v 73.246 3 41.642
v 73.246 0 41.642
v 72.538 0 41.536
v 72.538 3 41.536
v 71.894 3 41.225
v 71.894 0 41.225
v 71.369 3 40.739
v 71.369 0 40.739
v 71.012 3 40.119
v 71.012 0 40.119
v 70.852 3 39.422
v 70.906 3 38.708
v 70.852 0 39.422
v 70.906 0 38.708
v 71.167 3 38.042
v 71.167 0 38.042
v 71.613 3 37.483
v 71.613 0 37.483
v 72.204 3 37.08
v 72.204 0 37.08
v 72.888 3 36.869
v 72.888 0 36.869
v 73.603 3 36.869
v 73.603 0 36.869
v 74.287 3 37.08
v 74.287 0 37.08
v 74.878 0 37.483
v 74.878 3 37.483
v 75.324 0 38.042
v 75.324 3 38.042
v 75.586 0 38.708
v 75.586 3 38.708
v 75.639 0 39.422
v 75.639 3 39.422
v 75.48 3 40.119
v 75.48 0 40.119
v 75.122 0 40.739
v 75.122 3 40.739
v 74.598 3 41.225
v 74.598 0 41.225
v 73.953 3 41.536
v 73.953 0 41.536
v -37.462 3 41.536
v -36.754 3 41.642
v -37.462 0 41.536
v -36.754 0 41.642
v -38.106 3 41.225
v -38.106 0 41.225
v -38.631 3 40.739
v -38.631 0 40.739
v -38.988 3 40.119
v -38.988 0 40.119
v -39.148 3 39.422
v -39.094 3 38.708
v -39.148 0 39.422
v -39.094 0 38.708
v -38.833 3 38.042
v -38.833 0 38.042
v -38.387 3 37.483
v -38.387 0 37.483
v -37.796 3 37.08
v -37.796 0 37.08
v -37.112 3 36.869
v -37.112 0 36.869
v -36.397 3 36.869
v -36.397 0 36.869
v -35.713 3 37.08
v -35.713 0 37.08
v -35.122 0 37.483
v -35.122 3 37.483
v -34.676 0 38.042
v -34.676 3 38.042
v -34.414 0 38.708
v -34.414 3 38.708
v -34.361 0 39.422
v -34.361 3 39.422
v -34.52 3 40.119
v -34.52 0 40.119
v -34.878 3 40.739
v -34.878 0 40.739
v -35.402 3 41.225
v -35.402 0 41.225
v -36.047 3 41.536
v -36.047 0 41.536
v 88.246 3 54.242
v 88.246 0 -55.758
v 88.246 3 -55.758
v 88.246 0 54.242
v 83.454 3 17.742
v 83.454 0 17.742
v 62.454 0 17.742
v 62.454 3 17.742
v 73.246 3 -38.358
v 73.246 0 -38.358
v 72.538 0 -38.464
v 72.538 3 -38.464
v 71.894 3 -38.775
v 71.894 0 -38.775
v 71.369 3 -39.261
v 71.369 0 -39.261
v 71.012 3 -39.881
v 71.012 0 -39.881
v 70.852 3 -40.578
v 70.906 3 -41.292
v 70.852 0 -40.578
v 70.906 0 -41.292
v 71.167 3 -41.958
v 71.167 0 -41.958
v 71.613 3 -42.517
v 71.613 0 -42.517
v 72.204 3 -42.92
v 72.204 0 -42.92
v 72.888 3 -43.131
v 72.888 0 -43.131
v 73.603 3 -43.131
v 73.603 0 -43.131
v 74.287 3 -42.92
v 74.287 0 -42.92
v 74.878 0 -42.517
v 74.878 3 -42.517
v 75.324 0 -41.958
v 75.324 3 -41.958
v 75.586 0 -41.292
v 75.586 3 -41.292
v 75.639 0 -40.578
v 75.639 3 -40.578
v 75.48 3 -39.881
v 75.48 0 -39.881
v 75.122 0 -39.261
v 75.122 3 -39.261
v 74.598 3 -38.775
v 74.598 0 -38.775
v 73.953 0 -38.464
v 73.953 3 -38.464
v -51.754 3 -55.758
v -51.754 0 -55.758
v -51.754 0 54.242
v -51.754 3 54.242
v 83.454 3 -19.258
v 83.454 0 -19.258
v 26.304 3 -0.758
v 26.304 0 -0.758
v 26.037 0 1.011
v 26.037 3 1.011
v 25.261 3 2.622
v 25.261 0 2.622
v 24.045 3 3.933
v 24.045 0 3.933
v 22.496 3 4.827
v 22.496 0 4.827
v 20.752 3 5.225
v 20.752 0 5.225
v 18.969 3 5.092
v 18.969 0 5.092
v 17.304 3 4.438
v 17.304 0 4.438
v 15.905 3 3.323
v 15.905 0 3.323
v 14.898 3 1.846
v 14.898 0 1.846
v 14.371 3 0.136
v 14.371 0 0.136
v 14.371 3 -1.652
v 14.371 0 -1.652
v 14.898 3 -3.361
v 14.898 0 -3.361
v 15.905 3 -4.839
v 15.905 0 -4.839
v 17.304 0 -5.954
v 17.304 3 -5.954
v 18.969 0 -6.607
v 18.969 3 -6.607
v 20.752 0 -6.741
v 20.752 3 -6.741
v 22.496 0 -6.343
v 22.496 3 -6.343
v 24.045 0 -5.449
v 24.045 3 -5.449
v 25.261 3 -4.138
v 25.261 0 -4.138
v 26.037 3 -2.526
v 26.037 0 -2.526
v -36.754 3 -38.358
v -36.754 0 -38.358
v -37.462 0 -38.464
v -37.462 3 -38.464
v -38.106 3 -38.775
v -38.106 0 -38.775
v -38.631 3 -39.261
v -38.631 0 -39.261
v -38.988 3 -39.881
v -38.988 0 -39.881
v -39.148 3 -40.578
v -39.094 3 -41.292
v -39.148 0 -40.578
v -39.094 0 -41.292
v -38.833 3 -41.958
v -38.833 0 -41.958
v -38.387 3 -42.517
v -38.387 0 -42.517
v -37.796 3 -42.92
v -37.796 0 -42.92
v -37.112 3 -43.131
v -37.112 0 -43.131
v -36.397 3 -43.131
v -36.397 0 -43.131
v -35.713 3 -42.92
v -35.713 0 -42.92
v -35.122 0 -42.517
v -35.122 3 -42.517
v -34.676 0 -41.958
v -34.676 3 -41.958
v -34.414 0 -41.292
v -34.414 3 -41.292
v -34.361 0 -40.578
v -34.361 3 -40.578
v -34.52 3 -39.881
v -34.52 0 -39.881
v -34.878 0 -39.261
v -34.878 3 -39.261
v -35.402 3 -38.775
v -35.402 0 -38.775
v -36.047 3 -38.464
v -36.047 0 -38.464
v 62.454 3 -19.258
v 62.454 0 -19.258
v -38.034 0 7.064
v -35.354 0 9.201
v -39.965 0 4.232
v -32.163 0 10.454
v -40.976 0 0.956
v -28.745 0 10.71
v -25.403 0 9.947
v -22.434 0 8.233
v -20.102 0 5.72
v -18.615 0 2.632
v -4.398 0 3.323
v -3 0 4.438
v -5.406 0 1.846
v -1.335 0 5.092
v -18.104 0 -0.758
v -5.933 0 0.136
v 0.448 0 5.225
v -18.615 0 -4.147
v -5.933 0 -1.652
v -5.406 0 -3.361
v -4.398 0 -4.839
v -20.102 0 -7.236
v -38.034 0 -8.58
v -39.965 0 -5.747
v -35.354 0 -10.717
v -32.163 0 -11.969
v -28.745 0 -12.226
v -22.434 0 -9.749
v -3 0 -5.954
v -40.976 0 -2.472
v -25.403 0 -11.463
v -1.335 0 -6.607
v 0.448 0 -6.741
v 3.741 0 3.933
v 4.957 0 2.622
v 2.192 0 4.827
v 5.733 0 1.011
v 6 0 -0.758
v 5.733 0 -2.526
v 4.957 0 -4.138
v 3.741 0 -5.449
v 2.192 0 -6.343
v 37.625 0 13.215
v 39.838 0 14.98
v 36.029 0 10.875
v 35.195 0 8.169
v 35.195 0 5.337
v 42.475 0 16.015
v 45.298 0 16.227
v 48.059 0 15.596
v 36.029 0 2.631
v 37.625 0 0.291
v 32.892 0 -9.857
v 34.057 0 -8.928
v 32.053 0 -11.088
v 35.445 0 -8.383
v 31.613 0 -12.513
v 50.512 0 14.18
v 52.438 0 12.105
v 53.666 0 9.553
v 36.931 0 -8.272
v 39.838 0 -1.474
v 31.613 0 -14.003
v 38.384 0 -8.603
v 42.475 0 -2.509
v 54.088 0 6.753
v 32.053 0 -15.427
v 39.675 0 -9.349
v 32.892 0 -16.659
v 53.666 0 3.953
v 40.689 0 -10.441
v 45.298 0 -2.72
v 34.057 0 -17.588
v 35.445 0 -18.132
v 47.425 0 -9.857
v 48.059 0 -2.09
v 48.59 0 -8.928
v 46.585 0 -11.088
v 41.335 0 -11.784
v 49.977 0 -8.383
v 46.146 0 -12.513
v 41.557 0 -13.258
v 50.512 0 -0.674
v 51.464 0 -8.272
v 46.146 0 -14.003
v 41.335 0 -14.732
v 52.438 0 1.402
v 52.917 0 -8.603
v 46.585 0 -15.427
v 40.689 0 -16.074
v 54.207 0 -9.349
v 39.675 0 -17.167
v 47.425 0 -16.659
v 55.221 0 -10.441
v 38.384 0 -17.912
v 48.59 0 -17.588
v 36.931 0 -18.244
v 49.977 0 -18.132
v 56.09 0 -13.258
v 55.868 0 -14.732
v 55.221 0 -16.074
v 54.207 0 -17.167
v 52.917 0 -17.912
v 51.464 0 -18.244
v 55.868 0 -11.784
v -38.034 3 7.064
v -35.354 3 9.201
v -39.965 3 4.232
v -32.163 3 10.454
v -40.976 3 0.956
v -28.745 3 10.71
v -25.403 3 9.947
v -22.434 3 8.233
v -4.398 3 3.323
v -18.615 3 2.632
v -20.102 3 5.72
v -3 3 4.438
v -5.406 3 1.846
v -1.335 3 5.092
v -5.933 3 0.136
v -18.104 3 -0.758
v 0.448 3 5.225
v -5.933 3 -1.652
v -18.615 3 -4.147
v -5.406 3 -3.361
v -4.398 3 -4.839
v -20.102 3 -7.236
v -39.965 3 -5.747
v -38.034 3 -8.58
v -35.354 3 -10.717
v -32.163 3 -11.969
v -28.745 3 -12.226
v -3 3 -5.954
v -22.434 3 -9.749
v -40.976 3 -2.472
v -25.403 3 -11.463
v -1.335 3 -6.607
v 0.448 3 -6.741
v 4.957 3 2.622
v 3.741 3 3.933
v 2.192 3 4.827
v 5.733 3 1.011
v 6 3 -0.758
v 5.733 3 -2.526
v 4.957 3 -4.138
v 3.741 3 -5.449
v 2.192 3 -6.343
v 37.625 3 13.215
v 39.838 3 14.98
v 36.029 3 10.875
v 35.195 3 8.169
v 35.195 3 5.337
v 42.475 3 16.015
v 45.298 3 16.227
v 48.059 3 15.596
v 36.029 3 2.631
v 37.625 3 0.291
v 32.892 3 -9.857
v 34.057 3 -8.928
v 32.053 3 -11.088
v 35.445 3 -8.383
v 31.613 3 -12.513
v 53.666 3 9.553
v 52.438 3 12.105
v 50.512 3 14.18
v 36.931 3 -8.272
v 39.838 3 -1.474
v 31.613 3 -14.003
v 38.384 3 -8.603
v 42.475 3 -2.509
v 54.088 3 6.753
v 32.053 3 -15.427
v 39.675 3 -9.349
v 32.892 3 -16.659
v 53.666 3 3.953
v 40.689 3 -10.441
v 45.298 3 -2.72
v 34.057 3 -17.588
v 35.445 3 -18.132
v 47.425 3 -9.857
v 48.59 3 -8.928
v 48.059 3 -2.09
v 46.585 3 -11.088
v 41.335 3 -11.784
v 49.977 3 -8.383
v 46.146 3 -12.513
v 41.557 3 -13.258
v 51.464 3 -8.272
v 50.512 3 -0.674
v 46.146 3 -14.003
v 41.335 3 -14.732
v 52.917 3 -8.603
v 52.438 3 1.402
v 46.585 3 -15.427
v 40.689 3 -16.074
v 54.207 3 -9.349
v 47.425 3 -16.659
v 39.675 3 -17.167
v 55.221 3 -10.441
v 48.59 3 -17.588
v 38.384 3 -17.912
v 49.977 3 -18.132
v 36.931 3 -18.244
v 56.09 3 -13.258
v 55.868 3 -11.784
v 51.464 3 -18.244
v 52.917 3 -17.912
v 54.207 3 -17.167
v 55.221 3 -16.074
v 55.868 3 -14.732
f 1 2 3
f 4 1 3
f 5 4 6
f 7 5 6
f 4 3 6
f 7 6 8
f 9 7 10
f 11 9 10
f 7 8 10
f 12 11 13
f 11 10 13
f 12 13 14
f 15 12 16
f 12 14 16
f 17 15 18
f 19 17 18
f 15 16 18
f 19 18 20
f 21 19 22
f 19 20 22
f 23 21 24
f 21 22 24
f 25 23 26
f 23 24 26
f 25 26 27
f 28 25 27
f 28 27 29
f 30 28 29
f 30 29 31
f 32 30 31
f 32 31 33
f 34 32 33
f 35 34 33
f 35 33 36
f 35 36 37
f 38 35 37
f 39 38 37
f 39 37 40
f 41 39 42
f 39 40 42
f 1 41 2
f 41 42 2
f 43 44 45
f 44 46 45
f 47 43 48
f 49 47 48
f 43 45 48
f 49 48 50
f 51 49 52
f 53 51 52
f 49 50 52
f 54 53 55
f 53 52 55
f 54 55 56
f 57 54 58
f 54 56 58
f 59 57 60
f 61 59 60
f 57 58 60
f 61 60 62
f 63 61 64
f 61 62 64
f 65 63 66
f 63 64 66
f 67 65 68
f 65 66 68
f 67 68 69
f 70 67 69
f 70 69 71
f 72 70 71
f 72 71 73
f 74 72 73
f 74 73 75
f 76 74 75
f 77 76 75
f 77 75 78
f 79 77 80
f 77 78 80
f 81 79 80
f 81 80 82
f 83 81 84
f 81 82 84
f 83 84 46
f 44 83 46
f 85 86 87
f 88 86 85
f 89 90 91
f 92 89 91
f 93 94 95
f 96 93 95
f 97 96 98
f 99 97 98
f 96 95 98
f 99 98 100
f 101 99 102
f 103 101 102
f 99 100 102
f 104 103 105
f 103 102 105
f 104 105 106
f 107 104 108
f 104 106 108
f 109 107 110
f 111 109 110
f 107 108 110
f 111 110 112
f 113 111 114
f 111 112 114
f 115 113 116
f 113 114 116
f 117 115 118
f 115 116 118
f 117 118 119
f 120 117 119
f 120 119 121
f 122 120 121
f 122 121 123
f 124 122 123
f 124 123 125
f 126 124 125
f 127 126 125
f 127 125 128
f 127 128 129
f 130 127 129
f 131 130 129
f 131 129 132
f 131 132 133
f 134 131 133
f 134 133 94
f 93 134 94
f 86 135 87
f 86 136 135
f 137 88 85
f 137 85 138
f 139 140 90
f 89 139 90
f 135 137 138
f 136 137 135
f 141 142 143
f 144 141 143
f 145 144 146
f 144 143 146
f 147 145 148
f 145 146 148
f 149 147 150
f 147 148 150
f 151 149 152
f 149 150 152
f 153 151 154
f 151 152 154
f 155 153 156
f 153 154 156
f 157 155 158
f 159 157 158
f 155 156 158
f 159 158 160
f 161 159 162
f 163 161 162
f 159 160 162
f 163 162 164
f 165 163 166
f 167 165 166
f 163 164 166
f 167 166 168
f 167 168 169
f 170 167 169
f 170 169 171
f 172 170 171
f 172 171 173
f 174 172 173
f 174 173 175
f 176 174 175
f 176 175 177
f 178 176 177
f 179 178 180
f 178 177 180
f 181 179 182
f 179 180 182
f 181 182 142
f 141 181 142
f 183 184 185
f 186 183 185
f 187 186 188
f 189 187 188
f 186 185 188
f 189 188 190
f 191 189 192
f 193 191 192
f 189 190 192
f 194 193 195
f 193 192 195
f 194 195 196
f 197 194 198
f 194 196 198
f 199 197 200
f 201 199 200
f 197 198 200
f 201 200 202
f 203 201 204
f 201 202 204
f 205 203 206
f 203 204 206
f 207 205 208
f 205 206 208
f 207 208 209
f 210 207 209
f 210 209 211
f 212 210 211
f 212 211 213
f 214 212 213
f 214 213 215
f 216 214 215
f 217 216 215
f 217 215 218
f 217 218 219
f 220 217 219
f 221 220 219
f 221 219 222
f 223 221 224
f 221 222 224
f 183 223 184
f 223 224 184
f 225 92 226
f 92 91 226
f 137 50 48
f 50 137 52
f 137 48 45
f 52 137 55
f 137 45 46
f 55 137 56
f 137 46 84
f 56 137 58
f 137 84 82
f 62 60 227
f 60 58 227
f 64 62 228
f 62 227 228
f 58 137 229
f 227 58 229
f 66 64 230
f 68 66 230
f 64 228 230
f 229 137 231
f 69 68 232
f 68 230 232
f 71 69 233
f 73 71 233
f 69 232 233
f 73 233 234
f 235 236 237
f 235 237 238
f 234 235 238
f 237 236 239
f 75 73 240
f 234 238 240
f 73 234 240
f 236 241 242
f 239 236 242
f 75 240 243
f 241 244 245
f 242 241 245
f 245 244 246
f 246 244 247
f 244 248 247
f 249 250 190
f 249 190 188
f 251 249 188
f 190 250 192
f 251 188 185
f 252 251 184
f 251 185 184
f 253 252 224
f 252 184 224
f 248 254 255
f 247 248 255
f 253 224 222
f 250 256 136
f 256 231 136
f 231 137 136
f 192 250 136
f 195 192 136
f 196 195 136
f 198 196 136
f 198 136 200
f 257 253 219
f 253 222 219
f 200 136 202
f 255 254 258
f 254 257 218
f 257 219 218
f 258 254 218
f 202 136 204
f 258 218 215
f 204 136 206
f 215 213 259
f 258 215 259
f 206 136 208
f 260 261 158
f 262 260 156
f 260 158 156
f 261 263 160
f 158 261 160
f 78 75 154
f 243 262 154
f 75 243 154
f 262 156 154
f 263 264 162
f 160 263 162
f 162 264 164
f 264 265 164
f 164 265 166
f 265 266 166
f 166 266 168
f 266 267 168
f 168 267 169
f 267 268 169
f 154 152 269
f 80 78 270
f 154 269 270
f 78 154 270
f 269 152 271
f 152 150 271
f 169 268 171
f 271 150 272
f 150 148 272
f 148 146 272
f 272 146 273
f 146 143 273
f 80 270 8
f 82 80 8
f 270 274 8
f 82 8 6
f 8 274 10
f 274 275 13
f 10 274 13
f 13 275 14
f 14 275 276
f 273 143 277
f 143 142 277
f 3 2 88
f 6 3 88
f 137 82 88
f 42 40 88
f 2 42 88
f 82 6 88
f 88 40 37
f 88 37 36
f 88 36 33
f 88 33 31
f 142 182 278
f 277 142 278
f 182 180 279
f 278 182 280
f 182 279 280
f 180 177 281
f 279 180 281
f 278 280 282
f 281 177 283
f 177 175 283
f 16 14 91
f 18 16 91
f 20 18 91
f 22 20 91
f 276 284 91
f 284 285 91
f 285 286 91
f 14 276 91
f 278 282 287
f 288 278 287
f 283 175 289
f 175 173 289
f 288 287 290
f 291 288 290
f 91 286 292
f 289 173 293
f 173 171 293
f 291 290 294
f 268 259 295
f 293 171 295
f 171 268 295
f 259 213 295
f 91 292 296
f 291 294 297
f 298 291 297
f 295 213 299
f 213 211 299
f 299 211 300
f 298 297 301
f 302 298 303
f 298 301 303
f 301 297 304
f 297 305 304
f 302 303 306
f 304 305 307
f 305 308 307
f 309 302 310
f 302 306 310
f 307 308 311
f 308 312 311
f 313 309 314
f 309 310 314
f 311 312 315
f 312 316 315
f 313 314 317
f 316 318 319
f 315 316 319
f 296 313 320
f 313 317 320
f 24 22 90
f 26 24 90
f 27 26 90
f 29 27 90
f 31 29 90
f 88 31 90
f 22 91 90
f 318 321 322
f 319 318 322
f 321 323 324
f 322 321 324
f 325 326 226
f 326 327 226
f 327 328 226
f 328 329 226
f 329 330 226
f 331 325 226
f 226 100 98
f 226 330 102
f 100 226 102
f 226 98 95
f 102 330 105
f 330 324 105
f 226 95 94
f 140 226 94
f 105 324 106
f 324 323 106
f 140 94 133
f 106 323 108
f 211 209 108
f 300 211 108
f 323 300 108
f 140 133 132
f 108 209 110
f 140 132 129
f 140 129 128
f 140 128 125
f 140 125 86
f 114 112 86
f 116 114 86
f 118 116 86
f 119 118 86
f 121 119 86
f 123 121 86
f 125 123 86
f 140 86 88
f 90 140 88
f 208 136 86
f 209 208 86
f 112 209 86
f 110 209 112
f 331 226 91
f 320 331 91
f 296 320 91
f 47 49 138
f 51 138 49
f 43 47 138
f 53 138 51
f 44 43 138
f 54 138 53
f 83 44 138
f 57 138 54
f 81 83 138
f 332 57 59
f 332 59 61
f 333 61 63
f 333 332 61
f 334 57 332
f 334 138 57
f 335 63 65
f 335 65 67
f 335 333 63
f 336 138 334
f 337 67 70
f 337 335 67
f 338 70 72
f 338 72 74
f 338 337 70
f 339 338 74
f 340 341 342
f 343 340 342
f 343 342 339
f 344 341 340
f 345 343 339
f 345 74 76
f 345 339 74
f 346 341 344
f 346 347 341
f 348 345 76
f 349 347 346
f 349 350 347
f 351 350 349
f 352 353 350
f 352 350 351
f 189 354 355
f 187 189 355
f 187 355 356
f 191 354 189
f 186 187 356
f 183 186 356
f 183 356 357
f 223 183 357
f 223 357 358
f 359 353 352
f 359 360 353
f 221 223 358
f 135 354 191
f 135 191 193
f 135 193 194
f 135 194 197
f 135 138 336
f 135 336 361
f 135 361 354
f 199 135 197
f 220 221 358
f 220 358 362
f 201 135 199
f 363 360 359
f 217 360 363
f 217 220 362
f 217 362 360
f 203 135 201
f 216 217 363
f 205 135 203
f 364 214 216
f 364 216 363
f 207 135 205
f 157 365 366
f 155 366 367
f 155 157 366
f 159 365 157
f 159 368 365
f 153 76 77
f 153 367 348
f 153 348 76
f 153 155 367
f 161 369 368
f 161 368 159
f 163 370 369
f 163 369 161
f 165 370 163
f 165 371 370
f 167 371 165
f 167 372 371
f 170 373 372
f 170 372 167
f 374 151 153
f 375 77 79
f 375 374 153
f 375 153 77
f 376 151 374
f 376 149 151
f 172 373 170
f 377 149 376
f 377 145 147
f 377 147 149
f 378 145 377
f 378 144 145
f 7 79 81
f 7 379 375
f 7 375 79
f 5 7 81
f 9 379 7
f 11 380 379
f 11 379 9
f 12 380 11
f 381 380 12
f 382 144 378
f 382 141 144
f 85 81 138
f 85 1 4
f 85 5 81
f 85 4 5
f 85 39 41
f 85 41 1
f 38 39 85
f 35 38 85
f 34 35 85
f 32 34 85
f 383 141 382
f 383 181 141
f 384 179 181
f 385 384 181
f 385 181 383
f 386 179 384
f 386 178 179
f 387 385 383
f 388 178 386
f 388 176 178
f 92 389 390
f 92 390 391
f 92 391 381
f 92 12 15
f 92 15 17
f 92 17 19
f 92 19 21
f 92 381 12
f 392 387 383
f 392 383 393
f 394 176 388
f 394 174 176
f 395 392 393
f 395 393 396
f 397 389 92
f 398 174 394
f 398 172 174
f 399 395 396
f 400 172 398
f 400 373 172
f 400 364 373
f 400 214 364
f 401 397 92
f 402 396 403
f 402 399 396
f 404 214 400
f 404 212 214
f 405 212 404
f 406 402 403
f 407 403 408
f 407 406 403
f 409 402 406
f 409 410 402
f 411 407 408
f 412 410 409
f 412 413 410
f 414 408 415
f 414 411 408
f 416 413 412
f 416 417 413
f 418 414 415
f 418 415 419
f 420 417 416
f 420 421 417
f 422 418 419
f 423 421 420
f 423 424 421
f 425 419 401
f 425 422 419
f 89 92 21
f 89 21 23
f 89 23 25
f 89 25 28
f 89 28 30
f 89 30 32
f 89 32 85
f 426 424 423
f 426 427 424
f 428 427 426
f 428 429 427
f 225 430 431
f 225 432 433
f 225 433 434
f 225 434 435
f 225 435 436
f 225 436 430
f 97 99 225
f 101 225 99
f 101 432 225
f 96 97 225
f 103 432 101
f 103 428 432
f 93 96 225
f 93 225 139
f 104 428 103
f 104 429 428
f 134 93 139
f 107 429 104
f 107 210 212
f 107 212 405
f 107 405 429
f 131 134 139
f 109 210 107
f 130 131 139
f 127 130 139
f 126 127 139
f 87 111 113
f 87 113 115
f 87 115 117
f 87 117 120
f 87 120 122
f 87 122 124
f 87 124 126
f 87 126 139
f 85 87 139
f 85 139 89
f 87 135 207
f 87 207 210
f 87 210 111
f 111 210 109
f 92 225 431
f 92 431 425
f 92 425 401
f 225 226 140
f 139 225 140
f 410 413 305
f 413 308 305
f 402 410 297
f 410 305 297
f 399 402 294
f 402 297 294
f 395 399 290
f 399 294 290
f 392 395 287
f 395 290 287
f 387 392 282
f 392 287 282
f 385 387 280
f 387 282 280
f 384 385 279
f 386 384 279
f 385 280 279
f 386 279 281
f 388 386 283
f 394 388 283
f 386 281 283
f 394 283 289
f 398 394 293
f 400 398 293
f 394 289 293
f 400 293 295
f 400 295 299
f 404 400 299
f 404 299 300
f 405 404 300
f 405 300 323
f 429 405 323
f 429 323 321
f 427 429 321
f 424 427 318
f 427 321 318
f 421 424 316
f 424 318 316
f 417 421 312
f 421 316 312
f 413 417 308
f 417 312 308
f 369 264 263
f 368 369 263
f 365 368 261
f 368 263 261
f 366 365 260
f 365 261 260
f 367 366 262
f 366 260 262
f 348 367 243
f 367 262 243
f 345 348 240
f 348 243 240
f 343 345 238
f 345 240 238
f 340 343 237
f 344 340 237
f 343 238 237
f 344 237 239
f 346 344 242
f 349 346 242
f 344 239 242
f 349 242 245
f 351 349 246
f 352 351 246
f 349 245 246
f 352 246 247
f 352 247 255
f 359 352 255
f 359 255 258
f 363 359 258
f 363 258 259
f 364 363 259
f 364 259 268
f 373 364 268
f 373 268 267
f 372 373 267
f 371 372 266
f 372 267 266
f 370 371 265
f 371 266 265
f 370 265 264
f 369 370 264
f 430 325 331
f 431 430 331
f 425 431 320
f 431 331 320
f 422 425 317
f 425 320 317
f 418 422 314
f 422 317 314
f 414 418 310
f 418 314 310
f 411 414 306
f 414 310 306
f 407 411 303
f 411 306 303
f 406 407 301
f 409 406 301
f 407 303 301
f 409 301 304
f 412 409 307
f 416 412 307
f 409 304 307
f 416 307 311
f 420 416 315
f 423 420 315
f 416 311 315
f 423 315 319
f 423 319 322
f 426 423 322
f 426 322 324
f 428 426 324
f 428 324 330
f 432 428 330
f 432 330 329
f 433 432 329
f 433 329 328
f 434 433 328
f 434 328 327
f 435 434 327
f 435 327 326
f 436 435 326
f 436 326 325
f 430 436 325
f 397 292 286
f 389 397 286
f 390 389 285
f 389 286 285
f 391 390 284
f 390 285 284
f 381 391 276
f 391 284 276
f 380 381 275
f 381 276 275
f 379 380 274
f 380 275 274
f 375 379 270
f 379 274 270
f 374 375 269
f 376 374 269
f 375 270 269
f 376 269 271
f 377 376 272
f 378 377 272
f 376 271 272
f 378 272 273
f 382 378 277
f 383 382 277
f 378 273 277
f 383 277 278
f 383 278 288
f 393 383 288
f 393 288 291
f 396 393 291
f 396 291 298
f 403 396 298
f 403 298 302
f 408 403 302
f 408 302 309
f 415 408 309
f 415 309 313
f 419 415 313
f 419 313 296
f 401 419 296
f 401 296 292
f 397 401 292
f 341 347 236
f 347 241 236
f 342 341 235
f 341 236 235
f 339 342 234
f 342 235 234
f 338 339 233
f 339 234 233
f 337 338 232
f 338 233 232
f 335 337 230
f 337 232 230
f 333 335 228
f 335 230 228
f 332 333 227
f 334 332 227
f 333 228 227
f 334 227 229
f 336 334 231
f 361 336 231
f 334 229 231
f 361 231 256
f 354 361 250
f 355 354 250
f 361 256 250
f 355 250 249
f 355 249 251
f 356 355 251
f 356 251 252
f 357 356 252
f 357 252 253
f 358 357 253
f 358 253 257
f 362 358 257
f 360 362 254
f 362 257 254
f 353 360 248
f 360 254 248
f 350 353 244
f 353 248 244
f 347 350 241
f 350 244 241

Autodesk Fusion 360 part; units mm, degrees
sketch "Sketch1" plane through (0, 0, 0) normal (0, 1, 0) x (1, 0, 0)
  line L0 (-51.7543, 55.7578) -> (88.2457, 55.7578)
  line L1 (88.2457, 55.7578) -> (88.2457, -54.2422)
  line L2 (88.2457, -54.2422) -> (-51.7543, -54.2422)
  line L3 (-51.7543, -54.2422) -> (-51.7543, 55.7578)
  line L4 (-34.6167, 55.7578) -> (-34.6167, 25.7578)
  line L5 (-4.6987, -54.2422) -> (-4.6987, -24.2422)
  line L6 (-51.7543, -24.2422) -> (88.2457, -24.2422)
  line L7 (-51.7543, 25.7578) -> (88.2457, 25.7578)
  line L8 (62.4536, 19.2578) -> (83.4536, 19.2578)
  line L9 (83.4536, 19.2578) -> (83.4536, -17.7422)
  line L10 (83.4536, -17.7422) -> (62.4536, -17.7422)
  line L11 (62.4536, -17.7422) -> (62.4536, 19.2578)
  line L12 (28.1038, -13.9922) -> (12.5038, -13.9922)
  line L13 (12.5038, -13.9922) -> (12.5038, 15.5078)
  circle A0 centre (20.3038, 0.7578) radius 6
  line L14 (12.5038, -13.9922) -> (28.1038, 15.5078)
  line L15 (12.5038, 15.5078) -> (28.1038, -13.9922)
  line L16 (12.5038, 15.5078) -> (28.1038, 15.5078)
  line L17 (28.1038, 15.5078) -> (28.1038, -13.9922)
  line L18 (-7.8, 15.5078) -> (7.8, 15.5078)
  line L19 (-7.8, 15.5078) -> (7.8, -13.9922)
  circle A1 centre (0, 0.7578) radius 6
  line L20 (-7.8, -13.9922) -> (7.8, 15.5078)
  line L21 (-7.8, -13.9922) -> (-7.8, 15.5078)
  line L22 (7.8, 15.5078) -> (7.8, -13.9922)
  line L23 (7.8, -13.9922) -> (-7.8, -13.9922)
  line L24 (-51.7543, 0.7578) -> (88.2457, 0.7578)
  circle A2 centre (36.5574, 13.2578) radius 5
  line L25 (88.2457, 25.7578) -> (88.2457, 0.7578)
  line L26 (88.2457, 0.7578) -> (88.2457, -24.2422)
  line L27 (88.2457, 13.2578) -> (-51.7543, 13.2578)
  circle A3 centre (51.09, 13.2578) radius 5
  circle A4 centre (44.5885, -6.7531) radius 9.5
  circle A5 centre (-29.6042, 0.7578) radius 11.5
  point P0 (20.3038, 0.7578)
  point P1 (35.7195, -1.6286)
  point P2 (0, 0.7578)
  point P3 (-51.7543, 0.7578)
  point P4 (83.4536, 0.7578)
  point P5 (88.2457, 13.2578)
  point P6 (88.2457, -11.7422)
  dimension "d1" = 140
  dimension "d2" = 110
  dimension "d3" = 30
  dimension "d4" = 30
  dimension "d5" = 21
  dimension "d6" = 37
  dimension "d10" = 15.6
  dimension "d11" = 29.5
  dimension "d12" = 12
  dimension "d16" = 15.6
  dimension "d17" = 29.5
  dimension "d18" = 12
  dimension "d19" = 10
  dimension "d20" = 10
  dimension "d21" = 19
  dimension "d22" = 23
extrude "Extrude1" add sketch "Sketch1" along normal blind 3 contours L0 L3 L4 L7 | L0 L1 L4 L7 | L1 L3 L7 L8 L9 L11 L13 L16 L17 L18 L21 L22 A2 L25 L27 A3 | L3 L21 L24 L27 A5 | L1 L3 L6 L9 L10 L11 L12 L13 L17 L21 L22 L23 L24 L26 A4 A5 | L19 A1 L21 L24 L27 | L19 L21 L27 | L1 L9 L24 L25 L27 | L2 L3 L5 L6 | A1 L20 L21 L24 | L18 L19 L20 L27 | L19 A1 L20 L27 | L1 L2 L5 L6 | L19 A1 L20 L23 | L20 L22 L27 | A1 L20 L22 L24 L27 | L11 L17 L24 A2 L27 A3 A4 | L19 A1 L22 L24 | L13 L22 L24 L27 | L13 A0 L15 L24 L27 | L13 L15 L27 | L13 A0 L14 L24 | L14 L15 L16 L27 | A0 L14 L15 L27 | L12 A0 L14 L15 | L14 L17 L27 | A0 L14 L17 L24 L27 | A0 L15 L17 L24
sketch "Sketch2" plane through (0, 3, 0) normal (0, 1, 0) x (-1, 0, 0)
  line L0 (-83.4536, 17.7422) -> (-62.4536, 17.7422)
  line L1 (-62.4536, 17.7422) -> (-62.4536, -19.2578)
  line L2 (-62.4536, -19.2578) -> (-83.4536, -19.2578)
  line L3 (-83.4536, -19.2578) -> (-83.4536, 17.7422)
  circle A0 centre (-36.5574, -13.2578) radius 5
  circle A1 centre (-20.3038, -0.7578) radius 6
  circle A2 centre (-51.09, -13.2578) radius 5
  circle A3 centre (0, -0.7578) radius 6
  circle A4 centre (-44.5885, 6.7531) radius 9.5
  circle A5 centre (29.6042, -0.7578) radius 11.5
  line L4 (-88.2457, 54.2422) -> (-88.2457, -55.7578)
  line L5 (-88.2457, -55.7578) -> (51.7543, -55.7578)
  line L6 (51.7543, -55.7578) -> (51.7543, 54.2422)
  line L7 (51.7543, 54.2422) -> (-88.2457, 54.2422)
  line L8 (-17.1333, -55.7578) -> (-17.1333, -40.7578)
  line L9 (51.7543, -40.7578) -> (-88.2457, -40.7578)
  line L10 (-18.2457, 54.2422) -> (-18.2457, 39.2422)
  line L11 (51.7543, 39.2422) -> (-88.2457, 39.2422)
  line L12 (51.7543, -40.7578) -> (36.7543, -40.7578)
  line L13 (-88.2457, -40.7578) -> (-73.2457, -40.7578)
  line L14 (51.7543, 39.2422) -> (36.7543, 39.2422)
  line L15 (-88.2457, 39.2422) -> (-73.2457, 39.2422)
  point P0 (36.7543, -40.7578)
  point P1 (36.7543, 39.2422)
  point P2 (-73.2457, 39.2422)
  point P3 (-73.2457, -40.7578)
  dimension "d25" = 15
  dimension "d26" = 15
  dimension "d27" = 15
  dimension "d28" = 15
  dimension "d29" = 15
  dimension "d30" = 15
hole "Hole1" at (-36.7543, 3, -40.7578) at (-36.7543, 3, 39.2422) at (73.2457, 3, -40.7578) at (73.2457, 3, 39.2422) direction (0, -1, 0) diameter 4.8 depth 15 tip angle 180
